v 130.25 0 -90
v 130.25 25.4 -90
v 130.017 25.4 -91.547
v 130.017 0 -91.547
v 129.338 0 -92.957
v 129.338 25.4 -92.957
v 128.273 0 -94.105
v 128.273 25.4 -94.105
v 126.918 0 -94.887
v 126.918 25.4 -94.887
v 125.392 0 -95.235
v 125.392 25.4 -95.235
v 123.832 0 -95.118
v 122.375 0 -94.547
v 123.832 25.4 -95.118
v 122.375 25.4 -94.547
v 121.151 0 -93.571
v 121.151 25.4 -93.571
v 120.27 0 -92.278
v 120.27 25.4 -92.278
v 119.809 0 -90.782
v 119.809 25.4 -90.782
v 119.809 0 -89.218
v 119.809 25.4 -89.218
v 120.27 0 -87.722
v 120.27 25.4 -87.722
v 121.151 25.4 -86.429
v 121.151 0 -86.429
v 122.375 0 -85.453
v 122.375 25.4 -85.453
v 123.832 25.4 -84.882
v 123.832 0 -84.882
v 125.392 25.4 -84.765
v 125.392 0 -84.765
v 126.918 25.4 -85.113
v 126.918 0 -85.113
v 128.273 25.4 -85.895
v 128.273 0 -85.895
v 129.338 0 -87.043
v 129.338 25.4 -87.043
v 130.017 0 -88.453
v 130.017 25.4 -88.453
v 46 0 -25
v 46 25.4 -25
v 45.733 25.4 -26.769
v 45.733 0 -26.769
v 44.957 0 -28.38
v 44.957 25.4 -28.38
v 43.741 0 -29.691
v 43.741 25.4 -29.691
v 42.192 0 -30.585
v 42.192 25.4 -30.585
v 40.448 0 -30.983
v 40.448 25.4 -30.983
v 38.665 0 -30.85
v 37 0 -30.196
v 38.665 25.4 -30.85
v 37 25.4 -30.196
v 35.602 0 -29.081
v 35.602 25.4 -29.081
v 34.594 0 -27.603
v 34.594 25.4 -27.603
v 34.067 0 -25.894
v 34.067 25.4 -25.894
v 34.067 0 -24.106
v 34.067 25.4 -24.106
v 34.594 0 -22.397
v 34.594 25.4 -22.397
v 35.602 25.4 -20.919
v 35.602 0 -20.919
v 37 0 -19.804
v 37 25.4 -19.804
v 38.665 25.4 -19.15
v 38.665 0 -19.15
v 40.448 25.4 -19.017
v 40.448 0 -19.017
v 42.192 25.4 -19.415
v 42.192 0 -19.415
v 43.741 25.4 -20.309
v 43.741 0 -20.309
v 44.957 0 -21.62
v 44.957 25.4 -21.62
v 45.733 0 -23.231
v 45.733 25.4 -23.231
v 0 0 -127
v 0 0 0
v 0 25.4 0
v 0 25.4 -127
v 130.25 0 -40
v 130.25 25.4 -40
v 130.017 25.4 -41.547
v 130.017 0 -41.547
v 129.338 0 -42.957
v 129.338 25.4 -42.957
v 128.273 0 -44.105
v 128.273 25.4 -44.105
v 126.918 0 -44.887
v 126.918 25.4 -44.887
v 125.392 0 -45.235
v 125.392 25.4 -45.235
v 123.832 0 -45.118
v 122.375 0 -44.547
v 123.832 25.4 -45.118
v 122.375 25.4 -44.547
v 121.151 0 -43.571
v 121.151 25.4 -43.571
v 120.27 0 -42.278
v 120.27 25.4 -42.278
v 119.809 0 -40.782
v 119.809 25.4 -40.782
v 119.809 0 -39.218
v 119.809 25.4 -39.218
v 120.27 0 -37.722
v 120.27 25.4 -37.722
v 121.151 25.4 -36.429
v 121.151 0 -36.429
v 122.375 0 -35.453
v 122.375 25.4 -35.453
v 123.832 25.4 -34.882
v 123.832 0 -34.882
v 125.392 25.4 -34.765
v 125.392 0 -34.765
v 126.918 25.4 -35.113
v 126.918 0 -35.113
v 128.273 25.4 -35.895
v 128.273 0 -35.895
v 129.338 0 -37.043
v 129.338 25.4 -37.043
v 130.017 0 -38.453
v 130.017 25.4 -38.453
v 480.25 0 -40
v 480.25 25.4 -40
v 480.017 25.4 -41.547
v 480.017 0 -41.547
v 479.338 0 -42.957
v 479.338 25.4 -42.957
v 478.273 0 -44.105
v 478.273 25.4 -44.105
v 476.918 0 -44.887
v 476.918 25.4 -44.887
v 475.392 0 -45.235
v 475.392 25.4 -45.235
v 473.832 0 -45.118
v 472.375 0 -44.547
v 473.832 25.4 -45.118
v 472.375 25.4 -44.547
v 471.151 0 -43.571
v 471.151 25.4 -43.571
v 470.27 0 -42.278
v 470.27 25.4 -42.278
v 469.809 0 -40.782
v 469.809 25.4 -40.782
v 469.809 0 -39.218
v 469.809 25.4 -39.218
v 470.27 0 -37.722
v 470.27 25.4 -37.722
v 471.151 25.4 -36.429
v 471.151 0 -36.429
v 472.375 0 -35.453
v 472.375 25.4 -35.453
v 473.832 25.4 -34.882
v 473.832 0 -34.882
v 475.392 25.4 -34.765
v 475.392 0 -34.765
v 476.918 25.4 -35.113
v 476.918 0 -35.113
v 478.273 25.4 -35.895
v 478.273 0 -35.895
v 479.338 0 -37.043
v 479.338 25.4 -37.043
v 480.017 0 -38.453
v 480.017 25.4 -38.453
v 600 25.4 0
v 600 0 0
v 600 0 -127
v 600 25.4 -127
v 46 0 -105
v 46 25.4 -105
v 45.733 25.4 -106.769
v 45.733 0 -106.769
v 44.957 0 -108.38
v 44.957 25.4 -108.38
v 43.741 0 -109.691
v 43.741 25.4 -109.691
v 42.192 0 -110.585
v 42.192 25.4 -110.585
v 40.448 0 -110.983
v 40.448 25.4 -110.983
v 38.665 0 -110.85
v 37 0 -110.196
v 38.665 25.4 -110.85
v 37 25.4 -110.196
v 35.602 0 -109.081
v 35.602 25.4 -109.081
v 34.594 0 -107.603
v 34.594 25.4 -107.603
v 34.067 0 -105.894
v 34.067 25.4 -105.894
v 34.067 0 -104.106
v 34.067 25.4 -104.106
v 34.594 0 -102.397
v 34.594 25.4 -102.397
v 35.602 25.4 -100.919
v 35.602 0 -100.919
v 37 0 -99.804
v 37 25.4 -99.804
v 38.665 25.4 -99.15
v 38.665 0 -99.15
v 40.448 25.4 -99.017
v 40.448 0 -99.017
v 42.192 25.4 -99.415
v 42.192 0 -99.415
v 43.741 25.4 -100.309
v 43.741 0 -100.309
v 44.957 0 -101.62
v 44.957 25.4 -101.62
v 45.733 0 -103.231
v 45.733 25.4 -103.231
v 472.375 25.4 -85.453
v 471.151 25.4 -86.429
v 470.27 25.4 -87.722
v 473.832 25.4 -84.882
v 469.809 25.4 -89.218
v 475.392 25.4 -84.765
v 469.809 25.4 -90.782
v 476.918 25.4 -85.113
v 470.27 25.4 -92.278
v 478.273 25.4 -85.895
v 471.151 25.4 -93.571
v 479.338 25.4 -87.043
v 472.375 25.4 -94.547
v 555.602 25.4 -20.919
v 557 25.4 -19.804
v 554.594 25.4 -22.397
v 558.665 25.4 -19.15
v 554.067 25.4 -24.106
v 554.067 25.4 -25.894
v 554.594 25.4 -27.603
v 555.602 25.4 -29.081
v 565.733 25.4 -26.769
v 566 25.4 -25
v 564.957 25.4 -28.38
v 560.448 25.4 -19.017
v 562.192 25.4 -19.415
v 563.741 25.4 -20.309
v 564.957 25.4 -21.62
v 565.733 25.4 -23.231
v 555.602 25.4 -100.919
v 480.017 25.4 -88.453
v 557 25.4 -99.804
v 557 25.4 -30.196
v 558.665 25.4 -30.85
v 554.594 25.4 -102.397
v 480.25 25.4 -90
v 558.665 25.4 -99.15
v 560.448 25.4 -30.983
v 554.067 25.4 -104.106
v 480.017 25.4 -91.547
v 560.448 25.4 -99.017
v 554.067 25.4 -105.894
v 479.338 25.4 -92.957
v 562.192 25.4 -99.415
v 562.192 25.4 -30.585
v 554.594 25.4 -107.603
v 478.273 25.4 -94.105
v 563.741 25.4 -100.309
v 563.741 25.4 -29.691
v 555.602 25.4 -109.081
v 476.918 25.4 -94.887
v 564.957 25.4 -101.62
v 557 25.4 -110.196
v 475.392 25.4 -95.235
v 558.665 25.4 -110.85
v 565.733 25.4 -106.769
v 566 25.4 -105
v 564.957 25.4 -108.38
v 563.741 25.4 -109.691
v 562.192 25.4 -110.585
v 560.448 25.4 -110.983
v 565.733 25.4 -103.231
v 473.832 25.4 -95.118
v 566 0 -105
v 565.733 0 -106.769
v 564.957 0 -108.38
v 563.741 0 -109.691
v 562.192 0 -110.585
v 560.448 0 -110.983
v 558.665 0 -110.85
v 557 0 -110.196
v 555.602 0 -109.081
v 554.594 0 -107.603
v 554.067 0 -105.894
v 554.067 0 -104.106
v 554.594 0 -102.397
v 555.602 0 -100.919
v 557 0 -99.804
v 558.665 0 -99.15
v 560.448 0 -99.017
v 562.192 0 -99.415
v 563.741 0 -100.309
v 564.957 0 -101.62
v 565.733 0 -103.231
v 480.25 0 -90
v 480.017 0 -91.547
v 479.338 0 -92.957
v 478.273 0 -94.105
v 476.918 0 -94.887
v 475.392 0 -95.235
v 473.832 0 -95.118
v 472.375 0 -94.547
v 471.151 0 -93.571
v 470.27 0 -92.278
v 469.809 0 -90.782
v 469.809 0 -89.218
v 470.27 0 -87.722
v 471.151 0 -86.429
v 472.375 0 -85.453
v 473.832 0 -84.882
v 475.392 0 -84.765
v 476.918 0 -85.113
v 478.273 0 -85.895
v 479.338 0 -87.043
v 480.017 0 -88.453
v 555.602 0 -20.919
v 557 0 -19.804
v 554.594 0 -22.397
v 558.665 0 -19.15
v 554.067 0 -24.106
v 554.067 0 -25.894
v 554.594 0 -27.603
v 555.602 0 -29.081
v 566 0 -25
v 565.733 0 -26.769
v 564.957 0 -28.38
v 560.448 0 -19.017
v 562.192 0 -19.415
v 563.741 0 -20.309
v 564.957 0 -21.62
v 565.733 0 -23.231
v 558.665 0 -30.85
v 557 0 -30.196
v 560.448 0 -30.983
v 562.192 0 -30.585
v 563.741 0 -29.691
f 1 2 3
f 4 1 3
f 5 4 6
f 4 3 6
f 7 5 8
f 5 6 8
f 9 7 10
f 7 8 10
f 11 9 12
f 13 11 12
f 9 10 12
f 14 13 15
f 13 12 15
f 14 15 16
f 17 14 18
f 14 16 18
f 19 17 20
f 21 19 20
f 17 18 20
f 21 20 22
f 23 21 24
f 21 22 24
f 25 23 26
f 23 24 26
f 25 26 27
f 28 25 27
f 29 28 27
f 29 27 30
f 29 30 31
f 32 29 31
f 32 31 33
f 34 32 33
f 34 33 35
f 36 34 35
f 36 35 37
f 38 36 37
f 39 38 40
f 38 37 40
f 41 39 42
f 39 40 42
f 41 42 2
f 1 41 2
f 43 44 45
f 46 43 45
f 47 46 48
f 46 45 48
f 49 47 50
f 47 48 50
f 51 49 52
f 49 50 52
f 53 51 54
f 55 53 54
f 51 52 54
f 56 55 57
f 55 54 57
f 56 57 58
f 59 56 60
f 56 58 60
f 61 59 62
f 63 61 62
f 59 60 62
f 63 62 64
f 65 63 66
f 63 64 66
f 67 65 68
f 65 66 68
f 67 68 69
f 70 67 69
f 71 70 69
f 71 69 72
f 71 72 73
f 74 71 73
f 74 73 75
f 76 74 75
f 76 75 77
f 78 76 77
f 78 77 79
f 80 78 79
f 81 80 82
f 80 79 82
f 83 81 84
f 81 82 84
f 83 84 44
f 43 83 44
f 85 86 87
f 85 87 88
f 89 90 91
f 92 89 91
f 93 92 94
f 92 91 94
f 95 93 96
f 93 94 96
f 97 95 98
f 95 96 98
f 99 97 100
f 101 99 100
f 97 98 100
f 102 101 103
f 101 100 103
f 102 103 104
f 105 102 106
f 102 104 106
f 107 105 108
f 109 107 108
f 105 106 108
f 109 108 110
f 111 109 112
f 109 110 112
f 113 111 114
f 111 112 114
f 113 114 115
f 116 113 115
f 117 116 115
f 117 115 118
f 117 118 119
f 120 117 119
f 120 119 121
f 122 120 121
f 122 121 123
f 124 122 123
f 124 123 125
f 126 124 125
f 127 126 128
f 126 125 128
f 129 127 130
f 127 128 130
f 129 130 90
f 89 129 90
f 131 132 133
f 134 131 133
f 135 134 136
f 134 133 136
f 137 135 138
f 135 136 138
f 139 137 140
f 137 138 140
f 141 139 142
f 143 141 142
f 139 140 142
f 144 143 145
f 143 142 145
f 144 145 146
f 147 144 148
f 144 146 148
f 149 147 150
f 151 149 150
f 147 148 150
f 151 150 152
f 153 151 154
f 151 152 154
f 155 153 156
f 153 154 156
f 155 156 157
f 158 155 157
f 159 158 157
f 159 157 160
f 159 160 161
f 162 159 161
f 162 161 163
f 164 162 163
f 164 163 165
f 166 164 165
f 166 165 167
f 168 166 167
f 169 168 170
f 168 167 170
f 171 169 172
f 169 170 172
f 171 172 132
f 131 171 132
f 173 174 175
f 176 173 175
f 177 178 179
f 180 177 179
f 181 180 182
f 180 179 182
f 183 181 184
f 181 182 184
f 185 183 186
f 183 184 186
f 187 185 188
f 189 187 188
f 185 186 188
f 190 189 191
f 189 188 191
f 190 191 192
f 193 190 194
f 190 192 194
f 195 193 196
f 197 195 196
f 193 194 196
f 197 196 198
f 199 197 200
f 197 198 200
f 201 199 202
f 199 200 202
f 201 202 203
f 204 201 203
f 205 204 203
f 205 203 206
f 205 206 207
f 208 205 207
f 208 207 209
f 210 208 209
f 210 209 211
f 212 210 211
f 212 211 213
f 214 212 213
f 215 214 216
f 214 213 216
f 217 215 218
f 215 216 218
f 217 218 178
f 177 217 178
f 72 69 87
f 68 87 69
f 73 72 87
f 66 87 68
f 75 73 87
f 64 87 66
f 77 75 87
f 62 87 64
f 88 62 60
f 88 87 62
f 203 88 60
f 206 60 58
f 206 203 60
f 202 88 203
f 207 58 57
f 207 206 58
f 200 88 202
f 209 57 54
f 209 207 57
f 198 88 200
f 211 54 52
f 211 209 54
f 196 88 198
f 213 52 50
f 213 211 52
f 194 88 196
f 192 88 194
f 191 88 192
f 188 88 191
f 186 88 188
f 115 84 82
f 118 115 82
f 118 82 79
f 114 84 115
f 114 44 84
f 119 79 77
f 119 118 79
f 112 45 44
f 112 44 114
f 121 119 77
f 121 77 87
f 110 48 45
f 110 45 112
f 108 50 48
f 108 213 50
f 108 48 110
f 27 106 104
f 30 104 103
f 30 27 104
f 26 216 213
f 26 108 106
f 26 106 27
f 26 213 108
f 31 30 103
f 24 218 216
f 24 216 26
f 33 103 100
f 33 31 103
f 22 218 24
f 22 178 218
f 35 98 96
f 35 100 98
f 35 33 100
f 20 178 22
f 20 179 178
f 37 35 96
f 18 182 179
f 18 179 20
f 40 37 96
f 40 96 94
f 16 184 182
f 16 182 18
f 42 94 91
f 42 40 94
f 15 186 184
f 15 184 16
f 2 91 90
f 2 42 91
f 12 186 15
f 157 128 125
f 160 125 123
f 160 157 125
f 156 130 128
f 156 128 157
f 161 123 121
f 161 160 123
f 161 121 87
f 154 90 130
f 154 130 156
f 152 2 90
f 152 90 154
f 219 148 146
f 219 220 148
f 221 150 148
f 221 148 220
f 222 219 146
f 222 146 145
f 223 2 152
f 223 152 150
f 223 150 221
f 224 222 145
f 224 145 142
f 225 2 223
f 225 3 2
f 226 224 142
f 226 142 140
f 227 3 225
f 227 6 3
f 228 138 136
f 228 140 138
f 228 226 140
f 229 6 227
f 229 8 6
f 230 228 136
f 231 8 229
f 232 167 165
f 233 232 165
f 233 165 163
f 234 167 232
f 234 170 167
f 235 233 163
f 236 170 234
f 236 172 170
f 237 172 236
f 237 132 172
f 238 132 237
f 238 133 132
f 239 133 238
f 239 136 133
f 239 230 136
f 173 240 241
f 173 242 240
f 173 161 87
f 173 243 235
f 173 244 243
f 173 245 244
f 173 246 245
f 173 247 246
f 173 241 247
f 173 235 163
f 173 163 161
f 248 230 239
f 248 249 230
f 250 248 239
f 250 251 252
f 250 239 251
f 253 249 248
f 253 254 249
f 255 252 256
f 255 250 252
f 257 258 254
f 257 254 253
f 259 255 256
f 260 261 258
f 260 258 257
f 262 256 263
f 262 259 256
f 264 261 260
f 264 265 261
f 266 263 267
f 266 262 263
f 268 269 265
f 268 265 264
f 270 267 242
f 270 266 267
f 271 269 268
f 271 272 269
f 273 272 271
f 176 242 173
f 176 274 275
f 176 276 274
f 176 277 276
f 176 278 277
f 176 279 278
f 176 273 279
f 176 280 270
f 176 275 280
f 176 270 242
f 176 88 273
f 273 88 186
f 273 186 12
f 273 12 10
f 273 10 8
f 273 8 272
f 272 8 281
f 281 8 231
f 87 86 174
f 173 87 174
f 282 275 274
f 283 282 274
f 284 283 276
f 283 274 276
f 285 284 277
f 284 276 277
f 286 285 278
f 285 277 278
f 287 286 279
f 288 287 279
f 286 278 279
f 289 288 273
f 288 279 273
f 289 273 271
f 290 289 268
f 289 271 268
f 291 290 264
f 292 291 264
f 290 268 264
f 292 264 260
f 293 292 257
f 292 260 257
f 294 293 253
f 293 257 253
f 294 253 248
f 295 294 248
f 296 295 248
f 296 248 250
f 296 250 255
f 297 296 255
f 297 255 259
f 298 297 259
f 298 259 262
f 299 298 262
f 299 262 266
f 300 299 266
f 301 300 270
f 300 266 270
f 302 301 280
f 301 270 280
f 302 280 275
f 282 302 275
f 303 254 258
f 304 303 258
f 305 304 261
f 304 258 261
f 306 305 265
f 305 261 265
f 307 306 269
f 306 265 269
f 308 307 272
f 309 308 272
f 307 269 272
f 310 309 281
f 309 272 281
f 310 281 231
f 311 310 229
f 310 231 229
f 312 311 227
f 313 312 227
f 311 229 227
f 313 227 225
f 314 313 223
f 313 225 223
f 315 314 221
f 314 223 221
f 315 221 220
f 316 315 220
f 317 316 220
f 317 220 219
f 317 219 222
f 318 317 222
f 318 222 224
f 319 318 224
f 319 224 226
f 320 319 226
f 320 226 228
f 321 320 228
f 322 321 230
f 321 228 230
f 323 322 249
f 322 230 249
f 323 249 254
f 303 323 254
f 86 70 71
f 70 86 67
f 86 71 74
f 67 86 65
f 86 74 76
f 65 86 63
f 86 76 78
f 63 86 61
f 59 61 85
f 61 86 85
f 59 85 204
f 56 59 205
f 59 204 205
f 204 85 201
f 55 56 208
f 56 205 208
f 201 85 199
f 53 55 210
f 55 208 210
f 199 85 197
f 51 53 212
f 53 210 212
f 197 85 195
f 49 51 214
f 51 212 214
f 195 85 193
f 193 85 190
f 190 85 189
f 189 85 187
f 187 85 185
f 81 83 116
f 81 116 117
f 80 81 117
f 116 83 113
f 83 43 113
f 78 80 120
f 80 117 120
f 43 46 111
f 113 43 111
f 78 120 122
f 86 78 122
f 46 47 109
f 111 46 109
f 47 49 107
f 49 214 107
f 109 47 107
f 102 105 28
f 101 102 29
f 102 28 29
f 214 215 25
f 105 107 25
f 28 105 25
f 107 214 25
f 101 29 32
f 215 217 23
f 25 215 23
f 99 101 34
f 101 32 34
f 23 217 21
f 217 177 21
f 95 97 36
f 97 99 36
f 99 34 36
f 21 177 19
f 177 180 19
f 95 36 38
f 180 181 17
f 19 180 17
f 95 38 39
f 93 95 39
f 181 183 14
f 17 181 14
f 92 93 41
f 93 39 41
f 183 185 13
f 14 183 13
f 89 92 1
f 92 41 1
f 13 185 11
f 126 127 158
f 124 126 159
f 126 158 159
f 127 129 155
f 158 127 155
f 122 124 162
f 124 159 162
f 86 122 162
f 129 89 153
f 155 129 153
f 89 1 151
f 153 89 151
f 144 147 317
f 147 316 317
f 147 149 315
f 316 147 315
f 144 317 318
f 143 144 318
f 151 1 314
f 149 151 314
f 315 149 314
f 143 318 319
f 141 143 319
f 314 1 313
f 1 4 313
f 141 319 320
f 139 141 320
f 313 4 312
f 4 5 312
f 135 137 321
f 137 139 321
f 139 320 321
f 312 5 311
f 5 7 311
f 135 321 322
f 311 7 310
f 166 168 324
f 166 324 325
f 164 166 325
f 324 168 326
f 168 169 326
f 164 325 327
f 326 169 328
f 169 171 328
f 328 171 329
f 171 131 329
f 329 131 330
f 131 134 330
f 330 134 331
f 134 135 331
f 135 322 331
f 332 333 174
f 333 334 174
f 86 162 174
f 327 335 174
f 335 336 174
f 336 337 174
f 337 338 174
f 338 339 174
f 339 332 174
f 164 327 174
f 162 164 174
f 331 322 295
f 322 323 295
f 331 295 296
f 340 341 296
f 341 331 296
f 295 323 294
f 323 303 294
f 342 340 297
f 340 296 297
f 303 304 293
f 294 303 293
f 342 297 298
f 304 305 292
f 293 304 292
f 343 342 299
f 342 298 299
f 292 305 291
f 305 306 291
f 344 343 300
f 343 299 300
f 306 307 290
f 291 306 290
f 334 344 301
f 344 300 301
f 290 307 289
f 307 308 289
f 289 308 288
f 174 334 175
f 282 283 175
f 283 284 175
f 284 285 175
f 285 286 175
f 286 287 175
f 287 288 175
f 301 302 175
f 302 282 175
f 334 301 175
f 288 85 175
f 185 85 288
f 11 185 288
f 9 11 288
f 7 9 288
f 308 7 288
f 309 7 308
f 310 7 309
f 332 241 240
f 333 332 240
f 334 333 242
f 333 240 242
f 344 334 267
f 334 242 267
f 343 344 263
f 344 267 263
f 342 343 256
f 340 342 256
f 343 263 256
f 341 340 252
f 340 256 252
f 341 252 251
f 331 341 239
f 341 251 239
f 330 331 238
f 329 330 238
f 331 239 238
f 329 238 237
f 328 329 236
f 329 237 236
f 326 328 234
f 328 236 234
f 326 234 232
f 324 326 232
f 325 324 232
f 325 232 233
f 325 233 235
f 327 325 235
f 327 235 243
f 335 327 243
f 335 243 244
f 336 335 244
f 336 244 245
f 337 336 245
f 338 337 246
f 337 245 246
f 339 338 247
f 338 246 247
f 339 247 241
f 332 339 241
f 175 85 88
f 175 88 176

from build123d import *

# Parameters (mm, degrees)
SKETCH1_W           = 600
SKETCH1_H           = 127
BOSS_EXTRUDE1_DEPTH = 25.4
SKETCH2_R           = 6
CUT_EXTRUDE1_DEPTH  = 25.4
SKETCH3_R           = 5.25
CUT_EXTRUDE2_DEPTH  = 25.4


with BuildPart() as part:
    # Sketch1 → Boss-Extrude1 (new body)
    with BuildSketch(Plane(origin=(0, 0, 0), x_dir=(1, 0, 0), z_dir=(0, 1, 0))):
        with Locations((300, 63.5)):
            Rectangle(SKETCH1_W, SKETCH1_H)
    extrude(amount=BOSS_EXTRUDE1_DEPTH)

    # Sketch2 → Cut-Extrude1 (cut)
    with BuildSketch(Plane(origin=(0, 25.4, 0), x_dir=(1, 0, 0), z_dir=(0, 1, 0))):
        with Locations((40, 105)):
            Circle(SKETCH2_R)
        with Locations((40, 25)):
            Circle(SKETCH2_R)
        with Locations((560, 25)):
            Circle(SKETCH2_R)
        with Locations((560, 105)):
            Circle(SKETCH2_R)
    extrude(amount=-CUT_EXTRUDE1_DEPTH, mode=Mode.SUBTRACT)

    # Sketch3 → Cut-Extrude2 (cut)
    with BuildSketch(Plane(origin=(0, 25.4, 0), x_dir=(1, 0, 0), z_dir=(0, 1, 0))):
        with Locations((125, 90)):
            Circle(SKETCH3_R)
        with Locations((125, 40)):
            Circle(SKETCH3_R)
        with Locations((475, 40)):
            Circle(SKETCH3_R)
        with Locations((475, 90)):
            Circle(SKETCH3_R)
    extrude(amount=-CUT_EXTRUDE2_DEPTH, mode=Mode.SUBTRACT)


solid = part.part
